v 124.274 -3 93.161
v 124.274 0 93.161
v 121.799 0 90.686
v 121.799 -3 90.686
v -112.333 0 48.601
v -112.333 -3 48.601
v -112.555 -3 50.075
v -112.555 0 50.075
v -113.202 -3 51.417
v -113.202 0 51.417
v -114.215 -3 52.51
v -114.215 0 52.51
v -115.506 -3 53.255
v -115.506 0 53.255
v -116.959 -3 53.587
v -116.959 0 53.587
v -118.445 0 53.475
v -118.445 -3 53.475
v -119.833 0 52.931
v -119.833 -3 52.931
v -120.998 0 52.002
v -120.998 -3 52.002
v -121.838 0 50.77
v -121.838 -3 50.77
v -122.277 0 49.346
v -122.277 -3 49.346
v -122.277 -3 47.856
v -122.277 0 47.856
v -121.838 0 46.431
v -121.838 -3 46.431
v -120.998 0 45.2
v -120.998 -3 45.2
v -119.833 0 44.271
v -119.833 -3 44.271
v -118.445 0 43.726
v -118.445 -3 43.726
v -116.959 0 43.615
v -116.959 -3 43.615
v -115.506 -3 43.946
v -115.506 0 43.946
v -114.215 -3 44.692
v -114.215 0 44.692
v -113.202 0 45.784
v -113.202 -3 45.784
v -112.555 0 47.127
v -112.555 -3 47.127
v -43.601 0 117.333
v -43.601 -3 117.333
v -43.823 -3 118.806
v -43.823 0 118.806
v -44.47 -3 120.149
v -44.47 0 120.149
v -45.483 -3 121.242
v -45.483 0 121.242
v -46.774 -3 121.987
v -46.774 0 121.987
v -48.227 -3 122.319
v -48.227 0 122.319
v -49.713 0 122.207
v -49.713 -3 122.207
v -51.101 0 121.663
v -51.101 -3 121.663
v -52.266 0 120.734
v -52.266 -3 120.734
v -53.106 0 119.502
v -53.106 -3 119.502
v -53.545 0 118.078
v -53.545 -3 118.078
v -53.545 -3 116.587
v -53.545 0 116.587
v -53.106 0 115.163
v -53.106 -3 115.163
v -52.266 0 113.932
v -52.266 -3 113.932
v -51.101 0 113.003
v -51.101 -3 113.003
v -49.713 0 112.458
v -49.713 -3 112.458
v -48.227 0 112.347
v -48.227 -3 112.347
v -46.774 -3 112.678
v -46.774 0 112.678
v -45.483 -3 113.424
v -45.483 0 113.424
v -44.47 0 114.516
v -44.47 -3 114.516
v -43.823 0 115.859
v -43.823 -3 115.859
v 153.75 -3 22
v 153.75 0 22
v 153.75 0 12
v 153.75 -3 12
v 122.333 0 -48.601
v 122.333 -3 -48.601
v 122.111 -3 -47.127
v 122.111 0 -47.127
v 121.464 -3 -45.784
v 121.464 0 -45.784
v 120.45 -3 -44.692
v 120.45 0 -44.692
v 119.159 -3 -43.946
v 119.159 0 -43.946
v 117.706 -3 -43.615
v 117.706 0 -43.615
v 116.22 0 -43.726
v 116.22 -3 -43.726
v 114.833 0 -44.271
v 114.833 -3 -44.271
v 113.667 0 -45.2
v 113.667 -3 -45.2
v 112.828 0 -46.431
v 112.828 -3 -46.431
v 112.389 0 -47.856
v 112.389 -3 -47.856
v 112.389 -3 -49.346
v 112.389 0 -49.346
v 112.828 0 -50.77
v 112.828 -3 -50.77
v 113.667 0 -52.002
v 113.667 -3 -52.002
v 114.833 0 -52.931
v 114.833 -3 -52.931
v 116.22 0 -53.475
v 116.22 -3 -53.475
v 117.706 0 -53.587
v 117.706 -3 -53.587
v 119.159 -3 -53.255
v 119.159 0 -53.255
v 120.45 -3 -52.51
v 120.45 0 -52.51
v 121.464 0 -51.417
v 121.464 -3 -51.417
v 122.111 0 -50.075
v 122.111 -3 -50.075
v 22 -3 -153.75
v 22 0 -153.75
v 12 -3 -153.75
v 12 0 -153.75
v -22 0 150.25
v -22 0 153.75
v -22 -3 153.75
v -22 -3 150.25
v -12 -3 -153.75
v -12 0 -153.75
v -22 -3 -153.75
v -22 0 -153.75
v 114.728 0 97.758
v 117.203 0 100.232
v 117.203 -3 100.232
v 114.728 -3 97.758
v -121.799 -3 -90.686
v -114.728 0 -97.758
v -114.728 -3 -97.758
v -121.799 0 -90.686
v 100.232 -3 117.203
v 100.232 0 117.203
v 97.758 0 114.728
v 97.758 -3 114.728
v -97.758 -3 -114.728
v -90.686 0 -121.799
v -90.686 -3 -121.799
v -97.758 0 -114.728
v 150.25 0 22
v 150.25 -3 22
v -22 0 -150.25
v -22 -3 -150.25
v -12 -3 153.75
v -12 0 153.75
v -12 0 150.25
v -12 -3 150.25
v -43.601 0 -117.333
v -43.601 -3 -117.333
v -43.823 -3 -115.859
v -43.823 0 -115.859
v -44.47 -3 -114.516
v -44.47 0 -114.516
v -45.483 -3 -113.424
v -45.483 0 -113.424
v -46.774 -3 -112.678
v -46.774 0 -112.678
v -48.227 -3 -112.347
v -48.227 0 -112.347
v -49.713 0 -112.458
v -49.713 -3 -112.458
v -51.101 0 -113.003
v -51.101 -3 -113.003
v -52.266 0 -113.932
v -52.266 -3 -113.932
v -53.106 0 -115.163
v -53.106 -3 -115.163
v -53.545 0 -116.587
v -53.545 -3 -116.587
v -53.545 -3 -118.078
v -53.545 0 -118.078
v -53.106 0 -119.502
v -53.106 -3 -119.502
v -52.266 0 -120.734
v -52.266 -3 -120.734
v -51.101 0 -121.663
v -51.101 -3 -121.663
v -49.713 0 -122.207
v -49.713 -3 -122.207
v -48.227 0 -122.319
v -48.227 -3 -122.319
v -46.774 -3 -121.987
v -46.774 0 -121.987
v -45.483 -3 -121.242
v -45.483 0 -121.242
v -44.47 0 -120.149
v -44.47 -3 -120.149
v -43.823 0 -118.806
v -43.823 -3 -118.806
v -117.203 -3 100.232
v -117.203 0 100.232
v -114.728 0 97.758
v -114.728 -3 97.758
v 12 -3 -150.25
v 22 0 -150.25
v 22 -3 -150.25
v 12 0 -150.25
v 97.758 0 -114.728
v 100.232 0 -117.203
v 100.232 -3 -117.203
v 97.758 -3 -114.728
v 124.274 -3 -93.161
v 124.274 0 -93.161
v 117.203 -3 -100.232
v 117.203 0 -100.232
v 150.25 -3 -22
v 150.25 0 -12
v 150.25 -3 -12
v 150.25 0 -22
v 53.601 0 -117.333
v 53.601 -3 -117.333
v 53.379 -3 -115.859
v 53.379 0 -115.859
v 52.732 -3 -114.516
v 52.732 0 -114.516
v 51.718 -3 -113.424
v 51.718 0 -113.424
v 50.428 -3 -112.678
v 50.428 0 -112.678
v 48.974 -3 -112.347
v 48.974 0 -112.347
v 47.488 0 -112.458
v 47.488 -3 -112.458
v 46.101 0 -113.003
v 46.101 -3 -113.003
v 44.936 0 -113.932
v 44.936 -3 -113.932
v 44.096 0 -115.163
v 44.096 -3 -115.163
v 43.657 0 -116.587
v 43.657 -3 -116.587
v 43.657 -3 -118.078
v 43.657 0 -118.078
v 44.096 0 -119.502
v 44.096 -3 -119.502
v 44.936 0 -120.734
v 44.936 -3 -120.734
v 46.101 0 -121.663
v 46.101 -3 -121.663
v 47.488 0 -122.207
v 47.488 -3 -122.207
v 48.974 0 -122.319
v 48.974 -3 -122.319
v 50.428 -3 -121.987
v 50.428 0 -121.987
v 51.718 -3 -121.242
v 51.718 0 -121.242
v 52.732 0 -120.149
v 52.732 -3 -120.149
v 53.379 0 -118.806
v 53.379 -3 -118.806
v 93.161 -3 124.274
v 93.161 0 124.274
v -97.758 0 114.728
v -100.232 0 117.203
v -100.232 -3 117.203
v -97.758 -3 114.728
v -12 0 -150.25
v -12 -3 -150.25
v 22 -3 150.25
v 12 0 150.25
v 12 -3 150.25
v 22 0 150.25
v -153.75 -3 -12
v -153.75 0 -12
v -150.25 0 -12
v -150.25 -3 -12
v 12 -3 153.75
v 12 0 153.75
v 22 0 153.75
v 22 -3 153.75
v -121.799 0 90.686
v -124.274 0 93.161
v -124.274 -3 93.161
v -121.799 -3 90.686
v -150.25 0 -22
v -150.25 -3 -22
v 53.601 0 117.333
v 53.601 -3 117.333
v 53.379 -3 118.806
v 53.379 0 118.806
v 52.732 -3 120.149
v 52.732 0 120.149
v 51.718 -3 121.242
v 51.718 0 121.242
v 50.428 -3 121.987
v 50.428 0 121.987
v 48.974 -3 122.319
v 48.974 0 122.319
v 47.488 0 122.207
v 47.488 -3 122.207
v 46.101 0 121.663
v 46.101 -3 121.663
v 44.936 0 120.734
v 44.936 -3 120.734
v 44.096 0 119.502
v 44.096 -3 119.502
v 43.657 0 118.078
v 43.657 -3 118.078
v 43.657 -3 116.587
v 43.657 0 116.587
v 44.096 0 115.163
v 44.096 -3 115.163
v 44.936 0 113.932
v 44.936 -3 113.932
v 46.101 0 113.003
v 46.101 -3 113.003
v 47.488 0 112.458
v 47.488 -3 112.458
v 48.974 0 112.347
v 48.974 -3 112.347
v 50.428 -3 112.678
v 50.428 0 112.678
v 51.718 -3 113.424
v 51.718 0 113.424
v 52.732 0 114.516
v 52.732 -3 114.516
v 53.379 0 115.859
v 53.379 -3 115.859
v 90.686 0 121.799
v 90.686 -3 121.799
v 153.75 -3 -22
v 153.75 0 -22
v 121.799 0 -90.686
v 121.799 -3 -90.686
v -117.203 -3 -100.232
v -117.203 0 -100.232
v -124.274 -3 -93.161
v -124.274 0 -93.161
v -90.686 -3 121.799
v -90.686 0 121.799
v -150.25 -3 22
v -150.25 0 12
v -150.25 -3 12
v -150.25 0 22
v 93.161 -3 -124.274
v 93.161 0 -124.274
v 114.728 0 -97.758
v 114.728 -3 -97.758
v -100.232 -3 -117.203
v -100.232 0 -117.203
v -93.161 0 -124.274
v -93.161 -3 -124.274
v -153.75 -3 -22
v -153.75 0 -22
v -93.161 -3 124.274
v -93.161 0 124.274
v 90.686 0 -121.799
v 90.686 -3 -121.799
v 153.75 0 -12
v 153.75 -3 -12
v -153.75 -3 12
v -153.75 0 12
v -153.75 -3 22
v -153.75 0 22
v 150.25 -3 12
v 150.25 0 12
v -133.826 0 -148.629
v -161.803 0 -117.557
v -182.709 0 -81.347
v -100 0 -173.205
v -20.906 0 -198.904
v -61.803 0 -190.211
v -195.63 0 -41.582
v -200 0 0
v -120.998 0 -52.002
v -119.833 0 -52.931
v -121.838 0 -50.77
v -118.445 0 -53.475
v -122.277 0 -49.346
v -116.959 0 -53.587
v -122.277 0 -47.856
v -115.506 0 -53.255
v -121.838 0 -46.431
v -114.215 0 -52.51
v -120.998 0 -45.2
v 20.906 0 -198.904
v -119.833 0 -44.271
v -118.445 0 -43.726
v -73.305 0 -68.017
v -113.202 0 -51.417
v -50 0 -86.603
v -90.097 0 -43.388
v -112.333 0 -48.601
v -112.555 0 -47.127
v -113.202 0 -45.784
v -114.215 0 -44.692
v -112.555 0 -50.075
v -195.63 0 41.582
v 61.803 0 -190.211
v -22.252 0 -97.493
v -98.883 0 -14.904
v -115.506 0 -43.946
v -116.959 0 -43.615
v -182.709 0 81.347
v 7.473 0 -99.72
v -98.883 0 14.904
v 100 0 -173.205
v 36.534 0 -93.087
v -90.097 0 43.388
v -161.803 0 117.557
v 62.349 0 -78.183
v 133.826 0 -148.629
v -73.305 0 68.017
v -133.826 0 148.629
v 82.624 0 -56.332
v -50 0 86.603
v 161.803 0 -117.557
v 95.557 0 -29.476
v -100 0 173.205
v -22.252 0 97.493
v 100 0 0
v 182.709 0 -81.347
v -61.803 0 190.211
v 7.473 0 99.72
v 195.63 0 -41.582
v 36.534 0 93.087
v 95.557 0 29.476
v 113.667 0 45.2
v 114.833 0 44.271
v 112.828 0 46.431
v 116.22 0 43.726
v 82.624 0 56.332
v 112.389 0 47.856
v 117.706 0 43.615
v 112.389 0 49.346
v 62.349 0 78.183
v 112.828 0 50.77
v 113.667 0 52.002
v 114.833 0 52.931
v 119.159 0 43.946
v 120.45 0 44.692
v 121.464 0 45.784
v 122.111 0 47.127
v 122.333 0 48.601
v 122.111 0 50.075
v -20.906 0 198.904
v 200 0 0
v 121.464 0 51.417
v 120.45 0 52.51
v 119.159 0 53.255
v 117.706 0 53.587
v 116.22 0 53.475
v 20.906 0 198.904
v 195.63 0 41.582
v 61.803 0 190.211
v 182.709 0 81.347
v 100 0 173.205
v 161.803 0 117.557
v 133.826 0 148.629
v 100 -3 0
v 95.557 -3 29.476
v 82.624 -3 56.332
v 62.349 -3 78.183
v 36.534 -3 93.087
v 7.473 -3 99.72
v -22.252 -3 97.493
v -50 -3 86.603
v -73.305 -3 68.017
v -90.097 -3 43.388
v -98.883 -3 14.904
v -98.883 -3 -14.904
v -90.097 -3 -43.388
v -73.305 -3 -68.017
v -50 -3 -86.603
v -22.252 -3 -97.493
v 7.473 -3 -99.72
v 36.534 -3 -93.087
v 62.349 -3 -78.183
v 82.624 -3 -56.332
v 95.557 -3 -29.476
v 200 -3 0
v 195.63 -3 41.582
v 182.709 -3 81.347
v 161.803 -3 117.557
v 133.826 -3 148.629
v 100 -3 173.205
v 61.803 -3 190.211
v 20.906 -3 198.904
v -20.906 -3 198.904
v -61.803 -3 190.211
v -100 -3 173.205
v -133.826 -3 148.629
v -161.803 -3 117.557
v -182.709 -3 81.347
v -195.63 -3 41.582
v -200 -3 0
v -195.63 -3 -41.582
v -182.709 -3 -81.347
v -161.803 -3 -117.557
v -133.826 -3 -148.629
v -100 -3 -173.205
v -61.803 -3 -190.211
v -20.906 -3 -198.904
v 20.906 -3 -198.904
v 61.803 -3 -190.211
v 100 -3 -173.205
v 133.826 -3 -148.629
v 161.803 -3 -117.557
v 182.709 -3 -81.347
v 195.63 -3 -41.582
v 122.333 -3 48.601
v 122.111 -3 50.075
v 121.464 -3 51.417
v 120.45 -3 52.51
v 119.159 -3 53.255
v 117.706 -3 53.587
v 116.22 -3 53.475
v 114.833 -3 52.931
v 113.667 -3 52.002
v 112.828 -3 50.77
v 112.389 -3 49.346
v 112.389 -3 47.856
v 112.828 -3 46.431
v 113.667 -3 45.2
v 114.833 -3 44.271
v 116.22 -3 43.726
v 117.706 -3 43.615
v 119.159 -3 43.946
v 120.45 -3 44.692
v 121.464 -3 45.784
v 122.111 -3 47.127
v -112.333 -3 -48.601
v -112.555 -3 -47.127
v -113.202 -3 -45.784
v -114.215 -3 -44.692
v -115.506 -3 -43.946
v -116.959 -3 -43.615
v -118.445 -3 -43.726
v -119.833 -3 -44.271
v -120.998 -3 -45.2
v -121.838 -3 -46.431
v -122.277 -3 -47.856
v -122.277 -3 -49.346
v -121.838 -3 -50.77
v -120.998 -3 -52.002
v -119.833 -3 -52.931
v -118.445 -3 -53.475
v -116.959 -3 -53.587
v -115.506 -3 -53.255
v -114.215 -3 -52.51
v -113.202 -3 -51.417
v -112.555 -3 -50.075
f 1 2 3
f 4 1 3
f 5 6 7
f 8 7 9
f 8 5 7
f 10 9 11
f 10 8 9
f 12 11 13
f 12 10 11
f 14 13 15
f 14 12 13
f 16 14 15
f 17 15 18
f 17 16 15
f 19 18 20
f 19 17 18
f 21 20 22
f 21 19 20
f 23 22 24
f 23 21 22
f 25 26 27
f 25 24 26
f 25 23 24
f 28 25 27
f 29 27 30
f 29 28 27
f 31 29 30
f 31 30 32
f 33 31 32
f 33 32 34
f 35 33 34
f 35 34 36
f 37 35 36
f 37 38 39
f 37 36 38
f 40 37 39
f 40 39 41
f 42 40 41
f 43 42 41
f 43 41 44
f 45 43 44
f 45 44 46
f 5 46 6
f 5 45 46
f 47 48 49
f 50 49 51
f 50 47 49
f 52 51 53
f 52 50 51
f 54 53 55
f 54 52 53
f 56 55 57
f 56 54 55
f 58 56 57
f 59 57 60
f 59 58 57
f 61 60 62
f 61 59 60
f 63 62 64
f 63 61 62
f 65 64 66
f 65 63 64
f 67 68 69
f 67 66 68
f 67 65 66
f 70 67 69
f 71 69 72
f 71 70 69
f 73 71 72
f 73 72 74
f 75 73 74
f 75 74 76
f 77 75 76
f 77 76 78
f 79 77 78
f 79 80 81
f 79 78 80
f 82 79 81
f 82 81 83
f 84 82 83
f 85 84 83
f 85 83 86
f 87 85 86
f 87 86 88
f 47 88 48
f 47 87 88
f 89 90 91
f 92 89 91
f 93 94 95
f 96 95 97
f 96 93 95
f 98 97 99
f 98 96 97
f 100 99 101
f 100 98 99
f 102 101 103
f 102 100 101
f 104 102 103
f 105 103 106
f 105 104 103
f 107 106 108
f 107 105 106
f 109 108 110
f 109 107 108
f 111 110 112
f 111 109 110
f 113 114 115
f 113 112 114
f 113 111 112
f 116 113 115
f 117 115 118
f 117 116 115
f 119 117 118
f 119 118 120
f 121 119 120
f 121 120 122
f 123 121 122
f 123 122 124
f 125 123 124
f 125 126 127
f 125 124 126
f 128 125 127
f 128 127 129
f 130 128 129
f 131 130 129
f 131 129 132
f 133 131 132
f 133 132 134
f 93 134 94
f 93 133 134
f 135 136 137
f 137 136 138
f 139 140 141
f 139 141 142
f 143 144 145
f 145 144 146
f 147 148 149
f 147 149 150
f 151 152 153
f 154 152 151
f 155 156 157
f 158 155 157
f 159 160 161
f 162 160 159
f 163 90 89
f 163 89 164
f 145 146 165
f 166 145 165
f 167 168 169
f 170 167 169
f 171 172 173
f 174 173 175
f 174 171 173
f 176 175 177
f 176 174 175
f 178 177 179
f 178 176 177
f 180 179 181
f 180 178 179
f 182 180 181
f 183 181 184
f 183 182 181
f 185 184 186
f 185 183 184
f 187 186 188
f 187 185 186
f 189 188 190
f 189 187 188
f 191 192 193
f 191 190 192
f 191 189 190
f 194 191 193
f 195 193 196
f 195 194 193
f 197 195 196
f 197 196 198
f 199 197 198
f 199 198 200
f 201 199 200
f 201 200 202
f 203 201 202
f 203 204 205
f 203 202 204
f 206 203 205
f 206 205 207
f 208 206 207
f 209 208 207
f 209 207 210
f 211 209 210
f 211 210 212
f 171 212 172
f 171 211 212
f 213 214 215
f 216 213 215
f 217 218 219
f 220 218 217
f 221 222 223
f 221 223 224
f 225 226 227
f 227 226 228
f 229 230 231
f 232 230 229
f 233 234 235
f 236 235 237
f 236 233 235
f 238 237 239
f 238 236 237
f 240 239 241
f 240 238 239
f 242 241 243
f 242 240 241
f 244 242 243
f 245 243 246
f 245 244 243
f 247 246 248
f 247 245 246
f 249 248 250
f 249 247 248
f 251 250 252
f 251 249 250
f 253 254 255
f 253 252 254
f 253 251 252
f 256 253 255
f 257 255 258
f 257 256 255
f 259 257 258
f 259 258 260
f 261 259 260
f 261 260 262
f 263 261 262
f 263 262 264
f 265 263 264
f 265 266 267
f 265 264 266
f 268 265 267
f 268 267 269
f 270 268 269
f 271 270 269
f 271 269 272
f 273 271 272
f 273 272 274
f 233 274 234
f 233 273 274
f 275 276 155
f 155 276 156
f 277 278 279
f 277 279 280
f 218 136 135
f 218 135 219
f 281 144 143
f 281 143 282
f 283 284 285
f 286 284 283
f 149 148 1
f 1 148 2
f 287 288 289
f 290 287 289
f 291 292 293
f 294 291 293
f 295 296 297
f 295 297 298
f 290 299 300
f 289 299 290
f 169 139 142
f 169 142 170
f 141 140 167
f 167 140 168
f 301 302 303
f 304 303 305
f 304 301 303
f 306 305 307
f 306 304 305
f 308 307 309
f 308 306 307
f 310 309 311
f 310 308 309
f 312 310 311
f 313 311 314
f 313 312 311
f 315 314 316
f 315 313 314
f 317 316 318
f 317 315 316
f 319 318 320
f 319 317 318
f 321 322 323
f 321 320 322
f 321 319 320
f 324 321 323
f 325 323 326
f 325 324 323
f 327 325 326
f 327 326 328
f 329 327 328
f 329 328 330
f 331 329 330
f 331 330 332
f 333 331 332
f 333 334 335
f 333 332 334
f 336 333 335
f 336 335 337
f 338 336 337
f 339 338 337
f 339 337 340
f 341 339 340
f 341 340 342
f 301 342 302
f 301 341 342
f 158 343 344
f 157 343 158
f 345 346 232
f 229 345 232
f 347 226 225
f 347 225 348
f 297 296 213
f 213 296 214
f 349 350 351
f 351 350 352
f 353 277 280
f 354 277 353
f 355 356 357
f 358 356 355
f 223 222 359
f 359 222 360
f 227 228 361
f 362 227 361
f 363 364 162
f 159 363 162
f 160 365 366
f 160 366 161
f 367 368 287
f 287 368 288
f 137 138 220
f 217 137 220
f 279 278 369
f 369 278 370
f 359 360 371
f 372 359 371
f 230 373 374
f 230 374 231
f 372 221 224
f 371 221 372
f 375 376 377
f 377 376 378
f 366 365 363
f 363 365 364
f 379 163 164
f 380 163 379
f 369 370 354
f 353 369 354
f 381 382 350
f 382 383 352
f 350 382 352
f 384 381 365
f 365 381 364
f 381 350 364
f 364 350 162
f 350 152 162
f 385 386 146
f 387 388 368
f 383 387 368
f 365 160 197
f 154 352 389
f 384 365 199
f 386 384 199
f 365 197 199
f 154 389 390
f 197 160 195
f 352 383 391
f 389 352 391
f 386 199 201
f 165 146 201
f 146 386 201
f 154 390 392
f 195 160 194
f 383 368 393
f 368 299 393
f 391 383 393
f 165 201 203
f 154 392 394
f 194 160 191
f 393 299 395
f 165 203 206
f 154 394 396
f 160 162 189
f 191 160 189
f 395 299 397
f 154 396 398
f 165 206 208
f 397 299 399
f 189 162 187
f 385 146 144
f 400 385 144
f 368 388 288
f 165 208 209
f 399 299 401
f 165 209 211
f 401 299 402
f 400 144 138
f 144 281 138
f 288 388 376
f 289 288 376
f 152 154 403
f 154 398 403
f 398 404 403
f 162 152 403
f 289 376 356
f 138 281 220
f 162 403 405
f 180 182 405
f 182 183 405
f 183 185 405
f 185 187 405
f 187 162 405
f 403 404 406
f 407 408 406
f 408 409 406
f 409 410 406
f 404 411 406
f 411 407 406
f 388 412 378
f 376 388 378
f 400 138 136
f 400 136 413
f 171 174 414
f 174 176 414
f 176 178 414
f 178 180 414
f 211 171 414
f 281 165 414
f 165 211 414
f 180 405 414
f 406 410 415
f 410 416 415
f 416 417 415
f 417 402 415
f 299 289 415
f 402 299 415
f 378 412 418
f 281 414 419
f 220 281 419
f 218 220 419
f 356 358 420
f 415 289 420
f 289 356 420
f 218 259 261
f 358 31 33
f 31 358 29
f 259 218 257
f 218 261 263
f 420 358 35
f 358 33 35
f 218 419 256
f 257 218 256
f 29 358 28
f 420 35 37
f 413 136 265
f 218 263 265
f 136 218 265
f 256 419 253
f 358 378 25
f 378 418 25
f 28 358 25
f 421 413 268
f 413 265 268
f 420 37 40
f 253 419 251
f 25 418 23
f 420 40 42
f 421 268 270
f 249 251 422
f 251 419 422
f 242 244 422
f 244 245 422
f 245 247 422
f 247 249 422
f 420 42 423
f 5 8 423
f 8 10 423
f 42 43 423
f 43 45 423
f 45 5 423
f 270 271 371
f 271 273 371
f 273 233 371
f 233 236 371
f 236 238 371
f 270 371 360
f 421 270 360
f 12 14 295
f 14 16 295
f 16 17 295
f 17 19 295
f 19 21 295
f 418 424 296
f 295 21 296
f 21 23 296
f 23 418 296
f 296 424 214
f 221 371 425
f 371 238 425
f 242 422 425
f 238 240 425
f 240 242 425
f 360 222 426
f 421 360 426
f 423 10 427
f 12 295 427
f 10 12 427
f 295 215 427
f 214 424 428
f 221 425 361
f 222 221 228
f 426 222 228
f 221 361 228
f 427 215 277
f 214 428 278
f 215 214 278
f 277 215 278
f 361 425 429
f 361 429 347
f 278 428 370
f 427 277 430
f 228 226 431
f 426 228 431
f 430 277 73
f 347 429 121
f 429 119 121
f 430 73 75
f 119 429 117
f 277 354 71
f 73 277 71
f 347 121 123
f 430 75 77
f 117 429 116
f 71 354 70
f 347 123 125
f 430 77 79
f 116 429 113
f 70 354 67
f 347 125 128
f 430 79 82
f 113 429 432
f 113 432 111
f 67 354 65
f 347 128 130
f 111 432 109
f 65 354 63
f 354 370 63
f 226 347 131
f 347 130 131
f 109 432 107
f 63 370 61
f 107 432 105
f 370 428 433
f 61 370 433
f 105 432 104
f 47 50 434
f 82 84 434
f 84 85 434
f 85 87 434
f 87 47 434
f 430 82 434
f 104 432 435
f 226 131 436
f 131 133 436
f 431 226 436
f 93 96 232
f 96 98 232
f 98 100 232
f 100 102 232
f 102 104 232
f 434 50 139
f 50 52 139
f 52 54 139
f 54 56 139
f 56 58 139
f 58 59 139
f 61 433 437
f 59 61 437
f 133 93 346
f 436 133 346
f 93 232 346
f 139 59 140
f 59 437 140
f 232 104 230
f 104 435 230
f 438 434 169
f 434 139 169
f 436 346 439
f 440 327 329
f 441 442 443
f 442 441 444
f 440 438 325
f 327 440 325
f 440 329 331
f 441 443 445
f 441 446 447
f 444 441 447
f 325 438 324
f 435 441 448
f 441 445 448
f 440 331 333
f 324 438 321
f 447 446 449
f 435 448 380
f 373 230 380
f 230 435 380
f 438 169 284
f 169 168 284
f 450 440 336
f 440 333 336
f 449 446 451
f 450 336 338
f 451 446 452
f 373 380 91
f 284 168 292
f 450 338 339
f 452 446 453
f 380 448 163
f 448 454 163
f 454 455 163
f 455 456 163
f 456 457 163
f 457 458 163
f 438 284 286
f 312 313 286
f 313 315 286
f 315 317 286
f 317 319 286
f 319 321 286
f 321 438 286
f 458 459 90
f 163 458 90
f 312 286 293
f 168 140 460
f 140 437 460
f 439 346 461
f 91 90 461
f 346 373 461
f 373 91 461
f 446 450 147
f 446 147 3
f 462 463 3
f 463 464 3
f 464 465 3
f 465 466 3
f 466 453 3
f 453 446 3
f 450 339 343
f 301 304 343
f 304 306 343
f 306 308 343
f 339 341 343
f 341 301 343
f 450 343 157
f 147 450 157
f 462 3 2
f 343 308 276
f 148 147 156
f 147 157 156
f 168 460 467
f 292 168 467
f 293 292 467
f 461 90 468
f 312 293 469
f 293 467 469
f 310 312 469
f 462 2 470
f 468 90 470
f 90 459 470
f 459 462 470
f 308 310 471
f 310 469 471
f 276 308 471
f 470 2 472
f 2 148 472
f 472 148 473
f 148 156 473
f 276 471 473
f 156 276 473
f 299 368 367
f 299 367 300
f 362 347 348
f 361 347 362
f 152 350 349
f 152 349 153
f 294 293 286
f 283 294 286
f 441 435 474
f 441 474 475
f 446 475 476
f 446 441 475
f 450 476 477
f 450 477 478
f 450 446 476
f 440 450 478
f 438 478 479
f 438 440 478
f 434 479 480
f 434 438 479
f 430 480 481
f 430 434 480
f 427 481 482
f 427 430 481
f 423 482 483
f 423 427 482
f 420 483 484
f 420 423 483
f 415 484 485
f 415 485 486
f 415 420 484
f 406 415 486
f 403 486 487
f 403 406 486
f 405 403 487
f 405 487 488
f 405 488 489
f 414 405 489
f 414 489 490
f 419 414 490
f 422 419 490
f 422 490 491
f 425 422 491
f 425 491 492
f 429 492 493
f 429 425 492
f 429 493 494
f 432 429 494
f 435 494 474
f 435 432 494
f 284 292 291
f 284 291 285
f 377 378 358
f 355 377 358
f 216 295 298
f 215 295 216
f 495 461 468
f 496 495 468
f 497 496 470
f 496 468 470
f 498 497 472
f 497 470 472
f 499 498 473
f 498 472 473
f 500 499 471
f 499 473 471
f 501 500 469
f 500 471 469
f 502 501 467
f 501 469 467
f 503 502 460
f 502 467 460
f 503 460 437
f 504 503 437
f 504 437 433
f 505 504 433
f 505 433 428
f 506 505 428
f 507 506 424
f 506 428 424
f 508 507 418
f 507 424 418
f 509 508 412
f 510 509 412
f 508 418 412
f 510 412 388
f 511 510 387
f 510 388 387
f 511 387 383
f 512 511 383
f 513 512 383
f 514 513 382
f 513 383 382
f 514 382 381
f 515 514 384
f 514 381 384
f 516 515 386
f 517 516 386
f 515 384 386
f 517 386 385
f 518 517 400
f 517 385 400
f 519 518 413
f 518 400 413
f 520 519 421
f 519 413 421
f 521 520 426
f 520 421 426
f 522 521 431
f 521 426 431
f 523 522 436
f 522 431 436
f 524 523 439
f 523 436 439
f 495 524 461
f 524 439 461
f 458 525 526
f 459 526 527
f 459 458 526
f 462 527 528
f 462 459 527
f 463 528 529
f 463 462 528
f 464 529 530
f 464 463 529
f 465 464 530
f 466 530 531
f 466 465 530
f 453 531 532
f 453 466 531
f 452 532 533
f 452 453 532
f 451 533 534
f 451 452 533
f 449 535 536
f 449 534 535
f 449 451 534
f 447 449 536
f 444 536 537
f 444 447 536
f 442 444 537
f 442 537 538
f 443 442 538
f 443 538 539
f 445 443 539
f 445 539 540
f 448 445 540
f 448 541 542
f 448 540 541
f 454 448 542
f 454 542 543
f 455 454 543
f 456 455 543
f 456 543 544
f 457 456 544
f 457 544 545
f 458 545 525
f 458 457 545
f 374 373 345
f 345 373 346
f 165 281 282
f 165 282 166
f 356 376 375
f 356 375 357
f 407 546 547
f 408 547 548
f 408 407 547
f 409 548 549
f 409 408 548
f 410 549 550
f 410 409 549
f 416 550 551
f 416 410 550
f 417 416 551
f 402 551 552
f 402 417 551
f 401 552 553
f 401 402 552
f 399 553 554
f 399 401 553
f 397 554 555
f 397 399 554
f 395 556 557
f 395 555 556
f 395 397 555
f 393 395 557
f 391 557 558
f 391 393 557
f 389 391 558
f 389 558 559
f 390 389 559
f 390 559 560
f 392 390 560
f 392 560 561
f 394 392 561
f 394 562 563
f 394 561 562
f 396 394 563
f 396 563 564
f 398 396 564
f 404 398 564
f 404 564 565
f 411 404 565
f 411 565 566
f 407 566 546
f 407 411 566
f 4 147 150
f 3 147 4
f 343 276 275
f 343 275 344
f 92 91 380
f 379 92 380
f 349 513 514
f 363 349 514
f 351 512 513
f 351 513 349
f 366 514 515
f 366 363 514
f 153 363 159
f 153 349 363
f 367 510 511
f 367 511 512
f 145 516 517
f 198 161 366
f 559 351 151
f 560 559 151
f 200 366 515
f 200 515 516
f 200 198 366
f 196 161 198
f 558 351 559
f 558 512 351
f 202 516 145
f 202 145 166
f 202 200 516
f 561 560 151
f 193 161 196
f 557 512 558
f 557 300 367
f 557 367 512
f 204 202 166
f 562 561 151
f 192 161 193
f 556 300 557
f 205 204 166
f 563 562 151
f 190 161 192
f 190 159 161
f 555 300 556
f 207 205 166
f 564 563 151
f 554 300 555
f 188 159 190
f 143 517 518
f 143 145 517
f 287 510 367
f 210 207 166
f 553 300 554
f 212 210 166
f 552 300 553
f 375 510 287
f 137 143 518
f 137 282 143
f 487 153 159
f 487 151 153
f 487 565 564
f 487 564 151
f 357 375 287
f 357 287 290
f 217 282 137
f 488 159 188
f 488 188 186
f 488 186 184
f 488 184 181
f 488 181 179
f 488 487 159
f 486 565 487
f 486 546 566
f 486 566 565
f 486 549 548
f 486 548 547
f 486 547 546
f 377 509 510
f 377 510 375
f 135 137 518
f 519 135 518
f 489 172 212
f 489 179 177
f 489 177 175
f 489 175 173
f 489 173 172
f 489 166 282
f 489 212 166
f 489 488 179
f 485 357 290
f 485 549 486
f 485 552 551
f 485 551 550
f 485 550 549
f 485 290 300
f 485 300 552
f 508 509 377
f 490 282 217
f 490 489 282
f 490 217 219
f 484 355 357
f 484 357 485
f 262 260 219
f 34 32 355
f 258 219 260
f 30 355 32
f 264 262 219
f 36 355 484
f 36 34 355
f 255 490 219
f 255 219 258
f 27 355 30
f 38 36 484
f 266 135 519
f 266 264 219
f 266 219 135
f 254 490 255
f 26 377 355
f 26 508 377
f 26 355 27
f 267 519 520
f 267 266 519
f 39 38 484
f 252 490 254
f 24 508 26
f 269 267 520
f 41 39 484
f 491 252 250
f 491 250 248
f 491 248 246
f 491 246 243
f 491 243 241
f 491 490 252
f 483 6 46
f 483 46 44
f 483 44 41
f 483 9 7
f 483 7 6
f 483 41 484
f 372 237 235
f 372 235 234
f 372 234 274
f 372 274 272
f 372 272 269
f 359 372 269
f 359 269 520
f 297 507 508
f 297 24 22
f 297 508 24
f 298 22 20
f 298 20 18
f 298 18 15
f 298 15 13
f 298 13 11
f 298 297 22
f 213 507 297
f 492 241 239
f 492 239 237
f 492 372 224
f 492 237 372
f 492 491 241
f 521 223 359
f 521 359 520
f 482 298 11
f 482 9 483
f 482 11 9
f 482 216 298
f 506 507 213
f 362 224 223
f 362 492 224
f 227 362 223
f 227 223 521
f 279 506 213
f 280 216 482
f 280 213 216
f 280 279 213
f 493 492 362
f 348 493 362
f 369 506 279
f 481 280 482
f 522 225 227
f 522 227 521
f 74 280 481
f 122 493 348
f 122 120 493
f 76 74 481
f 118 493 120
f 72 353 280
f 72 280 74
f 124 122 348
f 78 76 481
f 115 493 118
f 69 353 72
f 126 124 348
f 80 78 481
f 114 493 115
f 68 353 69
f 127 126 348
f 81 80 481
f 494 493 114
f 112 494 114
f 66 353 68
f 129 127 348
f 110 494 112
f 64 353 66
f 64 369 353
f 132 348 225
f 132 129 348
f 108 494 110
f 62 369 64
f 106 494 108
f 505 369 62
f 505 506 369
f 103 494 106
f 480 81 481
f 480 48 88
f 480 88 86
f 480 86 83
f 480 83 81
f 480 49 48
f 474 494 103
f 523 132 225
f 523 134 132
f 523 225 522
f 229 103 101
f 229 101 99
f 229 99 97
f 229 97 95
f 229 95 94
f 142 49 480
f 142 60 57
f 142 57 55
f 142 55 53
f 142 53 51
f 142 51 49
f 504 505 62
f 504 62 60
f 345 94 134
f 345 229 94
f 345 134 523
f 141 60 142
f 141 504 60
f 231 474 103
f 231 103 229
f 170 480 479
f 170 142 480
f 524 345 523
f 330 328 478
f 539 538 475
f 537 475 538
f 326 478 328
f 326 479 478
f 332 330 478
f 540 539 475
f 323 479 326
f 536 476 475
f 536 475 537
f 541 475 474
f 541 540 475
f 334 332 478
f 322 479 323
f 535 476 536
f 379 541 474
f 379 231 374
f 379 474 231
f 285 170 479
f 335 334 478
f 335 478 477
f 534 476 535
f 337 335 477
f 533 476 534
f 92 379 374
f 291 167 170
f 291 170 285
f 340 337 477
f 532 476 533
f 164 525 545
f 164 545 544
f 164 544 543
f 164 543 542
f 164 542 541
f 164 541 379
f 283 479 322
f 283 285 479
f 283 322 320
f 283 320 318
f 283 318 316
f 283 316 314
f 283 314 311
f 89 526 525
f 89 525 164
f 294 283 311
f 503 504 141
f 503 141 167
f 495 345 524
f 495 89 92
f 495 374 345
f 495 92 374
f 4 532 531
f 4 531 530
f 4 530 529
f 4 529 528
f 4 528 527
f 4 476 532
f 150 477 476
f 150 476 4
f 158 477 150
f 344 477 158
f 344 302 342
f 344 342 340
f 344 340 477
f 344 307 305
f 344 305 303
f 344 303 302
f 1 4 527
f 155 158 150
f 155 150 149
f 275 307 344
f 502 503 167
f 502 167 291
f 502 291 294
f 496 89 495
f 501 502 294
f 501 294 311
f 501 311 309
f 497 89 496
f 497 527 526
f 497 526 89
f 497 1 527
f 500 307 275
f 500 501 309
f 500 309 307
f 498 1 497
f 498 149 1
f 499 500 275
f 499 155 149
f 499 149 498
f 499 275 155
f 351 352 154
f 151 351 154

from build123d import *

# Parameters (mm, degrees)
SKETCH_R           = 200
SKETCH_R_2         = 100
SKETCH_W           = 3.25
SKETCH_H           = 10
PAD_DEPTH          = 3
SKETCH001_W        = 3.5
SKETCH001_H        = 10
POCKET_DEPTH       = 1134.38776
POLARPATTERN_COUNT = 8
SKETCH002_R        = 5
POCKET001_DEPTH    = 5


with BuildPart() as part:
    # Sketch → Pad (new body)
    with BuildSketch(Plane.XZ):
        Circle(SKETCH_R)
        Circle(SKETCH_R_2, mode=Mode.SUBTRACT)
        with Locations((-152, 17)):
            Rectangle(SKETCH_W, SKETCH_H, mode=Mode.SUBTRACT)
        with Locations((-152, -17)):
            Rectangle(SKETCH_W, SKETCH_H, mode=Mode.SUBTRACT)
    extrude(amount=PAD_DEPTH)

    # Sketch001 → Pocket (cut, through all)
    with BuildSketch(Plane.XZ):
        with Locations((-152, 17)):
            Rectangle(SKETCH001_W, SKETCH001_H)
        with Locations((-152, -17)):
            Rectangle(SKETCH001_W, SKETCH001_H)
    pocket = extrude(amount=POCKET_DEPTH, mode=Mode.SUBTRACT)

    # PolarPattern: Pocket ×8 about axis
    polarpattern_axis = Axis((0, 0, 0), (0, -1, 0))
    for i in range(1, POLARPATTERN_COUNT):
        add(pocket.rotate(polarpattern_axis, i * 360 / POLARPATTERN_COUNT), mode=Mode.SUBTRACT)

    # Sketch002 → Pocket001 (cut)
    with BuildSketch(Plane.XZ):
        with Locations((-117.332701, 48.600796)):
            Circle(SKETCH002_R)
        with Locations((-48.600796, 117.332701)):
            Circle(SKETCH002_R)
        with Locations((48.600796, 117.332701)):
            Circle(SKETCH002_R)
        with Locations((117.332701, 48.600796)):
            Circle(SKETCH002_R)
        with Locations((117.332701, -48.600796)):
            Circle(SKETCH002_R)
        with Locations((48.600796, -117.332701)):
            Circle(SKETCH002_R)
        with Locations((-48.600796, -117.332701)):
            Circle(SKETCH002_R)
        with Locations((-117.332701, -48.600796)):
            Circle(SKETCH002_R)
    extrude(amount=POCKET001_DEPTH, mode=Mode.SUBTRACT)


solid = part.part
